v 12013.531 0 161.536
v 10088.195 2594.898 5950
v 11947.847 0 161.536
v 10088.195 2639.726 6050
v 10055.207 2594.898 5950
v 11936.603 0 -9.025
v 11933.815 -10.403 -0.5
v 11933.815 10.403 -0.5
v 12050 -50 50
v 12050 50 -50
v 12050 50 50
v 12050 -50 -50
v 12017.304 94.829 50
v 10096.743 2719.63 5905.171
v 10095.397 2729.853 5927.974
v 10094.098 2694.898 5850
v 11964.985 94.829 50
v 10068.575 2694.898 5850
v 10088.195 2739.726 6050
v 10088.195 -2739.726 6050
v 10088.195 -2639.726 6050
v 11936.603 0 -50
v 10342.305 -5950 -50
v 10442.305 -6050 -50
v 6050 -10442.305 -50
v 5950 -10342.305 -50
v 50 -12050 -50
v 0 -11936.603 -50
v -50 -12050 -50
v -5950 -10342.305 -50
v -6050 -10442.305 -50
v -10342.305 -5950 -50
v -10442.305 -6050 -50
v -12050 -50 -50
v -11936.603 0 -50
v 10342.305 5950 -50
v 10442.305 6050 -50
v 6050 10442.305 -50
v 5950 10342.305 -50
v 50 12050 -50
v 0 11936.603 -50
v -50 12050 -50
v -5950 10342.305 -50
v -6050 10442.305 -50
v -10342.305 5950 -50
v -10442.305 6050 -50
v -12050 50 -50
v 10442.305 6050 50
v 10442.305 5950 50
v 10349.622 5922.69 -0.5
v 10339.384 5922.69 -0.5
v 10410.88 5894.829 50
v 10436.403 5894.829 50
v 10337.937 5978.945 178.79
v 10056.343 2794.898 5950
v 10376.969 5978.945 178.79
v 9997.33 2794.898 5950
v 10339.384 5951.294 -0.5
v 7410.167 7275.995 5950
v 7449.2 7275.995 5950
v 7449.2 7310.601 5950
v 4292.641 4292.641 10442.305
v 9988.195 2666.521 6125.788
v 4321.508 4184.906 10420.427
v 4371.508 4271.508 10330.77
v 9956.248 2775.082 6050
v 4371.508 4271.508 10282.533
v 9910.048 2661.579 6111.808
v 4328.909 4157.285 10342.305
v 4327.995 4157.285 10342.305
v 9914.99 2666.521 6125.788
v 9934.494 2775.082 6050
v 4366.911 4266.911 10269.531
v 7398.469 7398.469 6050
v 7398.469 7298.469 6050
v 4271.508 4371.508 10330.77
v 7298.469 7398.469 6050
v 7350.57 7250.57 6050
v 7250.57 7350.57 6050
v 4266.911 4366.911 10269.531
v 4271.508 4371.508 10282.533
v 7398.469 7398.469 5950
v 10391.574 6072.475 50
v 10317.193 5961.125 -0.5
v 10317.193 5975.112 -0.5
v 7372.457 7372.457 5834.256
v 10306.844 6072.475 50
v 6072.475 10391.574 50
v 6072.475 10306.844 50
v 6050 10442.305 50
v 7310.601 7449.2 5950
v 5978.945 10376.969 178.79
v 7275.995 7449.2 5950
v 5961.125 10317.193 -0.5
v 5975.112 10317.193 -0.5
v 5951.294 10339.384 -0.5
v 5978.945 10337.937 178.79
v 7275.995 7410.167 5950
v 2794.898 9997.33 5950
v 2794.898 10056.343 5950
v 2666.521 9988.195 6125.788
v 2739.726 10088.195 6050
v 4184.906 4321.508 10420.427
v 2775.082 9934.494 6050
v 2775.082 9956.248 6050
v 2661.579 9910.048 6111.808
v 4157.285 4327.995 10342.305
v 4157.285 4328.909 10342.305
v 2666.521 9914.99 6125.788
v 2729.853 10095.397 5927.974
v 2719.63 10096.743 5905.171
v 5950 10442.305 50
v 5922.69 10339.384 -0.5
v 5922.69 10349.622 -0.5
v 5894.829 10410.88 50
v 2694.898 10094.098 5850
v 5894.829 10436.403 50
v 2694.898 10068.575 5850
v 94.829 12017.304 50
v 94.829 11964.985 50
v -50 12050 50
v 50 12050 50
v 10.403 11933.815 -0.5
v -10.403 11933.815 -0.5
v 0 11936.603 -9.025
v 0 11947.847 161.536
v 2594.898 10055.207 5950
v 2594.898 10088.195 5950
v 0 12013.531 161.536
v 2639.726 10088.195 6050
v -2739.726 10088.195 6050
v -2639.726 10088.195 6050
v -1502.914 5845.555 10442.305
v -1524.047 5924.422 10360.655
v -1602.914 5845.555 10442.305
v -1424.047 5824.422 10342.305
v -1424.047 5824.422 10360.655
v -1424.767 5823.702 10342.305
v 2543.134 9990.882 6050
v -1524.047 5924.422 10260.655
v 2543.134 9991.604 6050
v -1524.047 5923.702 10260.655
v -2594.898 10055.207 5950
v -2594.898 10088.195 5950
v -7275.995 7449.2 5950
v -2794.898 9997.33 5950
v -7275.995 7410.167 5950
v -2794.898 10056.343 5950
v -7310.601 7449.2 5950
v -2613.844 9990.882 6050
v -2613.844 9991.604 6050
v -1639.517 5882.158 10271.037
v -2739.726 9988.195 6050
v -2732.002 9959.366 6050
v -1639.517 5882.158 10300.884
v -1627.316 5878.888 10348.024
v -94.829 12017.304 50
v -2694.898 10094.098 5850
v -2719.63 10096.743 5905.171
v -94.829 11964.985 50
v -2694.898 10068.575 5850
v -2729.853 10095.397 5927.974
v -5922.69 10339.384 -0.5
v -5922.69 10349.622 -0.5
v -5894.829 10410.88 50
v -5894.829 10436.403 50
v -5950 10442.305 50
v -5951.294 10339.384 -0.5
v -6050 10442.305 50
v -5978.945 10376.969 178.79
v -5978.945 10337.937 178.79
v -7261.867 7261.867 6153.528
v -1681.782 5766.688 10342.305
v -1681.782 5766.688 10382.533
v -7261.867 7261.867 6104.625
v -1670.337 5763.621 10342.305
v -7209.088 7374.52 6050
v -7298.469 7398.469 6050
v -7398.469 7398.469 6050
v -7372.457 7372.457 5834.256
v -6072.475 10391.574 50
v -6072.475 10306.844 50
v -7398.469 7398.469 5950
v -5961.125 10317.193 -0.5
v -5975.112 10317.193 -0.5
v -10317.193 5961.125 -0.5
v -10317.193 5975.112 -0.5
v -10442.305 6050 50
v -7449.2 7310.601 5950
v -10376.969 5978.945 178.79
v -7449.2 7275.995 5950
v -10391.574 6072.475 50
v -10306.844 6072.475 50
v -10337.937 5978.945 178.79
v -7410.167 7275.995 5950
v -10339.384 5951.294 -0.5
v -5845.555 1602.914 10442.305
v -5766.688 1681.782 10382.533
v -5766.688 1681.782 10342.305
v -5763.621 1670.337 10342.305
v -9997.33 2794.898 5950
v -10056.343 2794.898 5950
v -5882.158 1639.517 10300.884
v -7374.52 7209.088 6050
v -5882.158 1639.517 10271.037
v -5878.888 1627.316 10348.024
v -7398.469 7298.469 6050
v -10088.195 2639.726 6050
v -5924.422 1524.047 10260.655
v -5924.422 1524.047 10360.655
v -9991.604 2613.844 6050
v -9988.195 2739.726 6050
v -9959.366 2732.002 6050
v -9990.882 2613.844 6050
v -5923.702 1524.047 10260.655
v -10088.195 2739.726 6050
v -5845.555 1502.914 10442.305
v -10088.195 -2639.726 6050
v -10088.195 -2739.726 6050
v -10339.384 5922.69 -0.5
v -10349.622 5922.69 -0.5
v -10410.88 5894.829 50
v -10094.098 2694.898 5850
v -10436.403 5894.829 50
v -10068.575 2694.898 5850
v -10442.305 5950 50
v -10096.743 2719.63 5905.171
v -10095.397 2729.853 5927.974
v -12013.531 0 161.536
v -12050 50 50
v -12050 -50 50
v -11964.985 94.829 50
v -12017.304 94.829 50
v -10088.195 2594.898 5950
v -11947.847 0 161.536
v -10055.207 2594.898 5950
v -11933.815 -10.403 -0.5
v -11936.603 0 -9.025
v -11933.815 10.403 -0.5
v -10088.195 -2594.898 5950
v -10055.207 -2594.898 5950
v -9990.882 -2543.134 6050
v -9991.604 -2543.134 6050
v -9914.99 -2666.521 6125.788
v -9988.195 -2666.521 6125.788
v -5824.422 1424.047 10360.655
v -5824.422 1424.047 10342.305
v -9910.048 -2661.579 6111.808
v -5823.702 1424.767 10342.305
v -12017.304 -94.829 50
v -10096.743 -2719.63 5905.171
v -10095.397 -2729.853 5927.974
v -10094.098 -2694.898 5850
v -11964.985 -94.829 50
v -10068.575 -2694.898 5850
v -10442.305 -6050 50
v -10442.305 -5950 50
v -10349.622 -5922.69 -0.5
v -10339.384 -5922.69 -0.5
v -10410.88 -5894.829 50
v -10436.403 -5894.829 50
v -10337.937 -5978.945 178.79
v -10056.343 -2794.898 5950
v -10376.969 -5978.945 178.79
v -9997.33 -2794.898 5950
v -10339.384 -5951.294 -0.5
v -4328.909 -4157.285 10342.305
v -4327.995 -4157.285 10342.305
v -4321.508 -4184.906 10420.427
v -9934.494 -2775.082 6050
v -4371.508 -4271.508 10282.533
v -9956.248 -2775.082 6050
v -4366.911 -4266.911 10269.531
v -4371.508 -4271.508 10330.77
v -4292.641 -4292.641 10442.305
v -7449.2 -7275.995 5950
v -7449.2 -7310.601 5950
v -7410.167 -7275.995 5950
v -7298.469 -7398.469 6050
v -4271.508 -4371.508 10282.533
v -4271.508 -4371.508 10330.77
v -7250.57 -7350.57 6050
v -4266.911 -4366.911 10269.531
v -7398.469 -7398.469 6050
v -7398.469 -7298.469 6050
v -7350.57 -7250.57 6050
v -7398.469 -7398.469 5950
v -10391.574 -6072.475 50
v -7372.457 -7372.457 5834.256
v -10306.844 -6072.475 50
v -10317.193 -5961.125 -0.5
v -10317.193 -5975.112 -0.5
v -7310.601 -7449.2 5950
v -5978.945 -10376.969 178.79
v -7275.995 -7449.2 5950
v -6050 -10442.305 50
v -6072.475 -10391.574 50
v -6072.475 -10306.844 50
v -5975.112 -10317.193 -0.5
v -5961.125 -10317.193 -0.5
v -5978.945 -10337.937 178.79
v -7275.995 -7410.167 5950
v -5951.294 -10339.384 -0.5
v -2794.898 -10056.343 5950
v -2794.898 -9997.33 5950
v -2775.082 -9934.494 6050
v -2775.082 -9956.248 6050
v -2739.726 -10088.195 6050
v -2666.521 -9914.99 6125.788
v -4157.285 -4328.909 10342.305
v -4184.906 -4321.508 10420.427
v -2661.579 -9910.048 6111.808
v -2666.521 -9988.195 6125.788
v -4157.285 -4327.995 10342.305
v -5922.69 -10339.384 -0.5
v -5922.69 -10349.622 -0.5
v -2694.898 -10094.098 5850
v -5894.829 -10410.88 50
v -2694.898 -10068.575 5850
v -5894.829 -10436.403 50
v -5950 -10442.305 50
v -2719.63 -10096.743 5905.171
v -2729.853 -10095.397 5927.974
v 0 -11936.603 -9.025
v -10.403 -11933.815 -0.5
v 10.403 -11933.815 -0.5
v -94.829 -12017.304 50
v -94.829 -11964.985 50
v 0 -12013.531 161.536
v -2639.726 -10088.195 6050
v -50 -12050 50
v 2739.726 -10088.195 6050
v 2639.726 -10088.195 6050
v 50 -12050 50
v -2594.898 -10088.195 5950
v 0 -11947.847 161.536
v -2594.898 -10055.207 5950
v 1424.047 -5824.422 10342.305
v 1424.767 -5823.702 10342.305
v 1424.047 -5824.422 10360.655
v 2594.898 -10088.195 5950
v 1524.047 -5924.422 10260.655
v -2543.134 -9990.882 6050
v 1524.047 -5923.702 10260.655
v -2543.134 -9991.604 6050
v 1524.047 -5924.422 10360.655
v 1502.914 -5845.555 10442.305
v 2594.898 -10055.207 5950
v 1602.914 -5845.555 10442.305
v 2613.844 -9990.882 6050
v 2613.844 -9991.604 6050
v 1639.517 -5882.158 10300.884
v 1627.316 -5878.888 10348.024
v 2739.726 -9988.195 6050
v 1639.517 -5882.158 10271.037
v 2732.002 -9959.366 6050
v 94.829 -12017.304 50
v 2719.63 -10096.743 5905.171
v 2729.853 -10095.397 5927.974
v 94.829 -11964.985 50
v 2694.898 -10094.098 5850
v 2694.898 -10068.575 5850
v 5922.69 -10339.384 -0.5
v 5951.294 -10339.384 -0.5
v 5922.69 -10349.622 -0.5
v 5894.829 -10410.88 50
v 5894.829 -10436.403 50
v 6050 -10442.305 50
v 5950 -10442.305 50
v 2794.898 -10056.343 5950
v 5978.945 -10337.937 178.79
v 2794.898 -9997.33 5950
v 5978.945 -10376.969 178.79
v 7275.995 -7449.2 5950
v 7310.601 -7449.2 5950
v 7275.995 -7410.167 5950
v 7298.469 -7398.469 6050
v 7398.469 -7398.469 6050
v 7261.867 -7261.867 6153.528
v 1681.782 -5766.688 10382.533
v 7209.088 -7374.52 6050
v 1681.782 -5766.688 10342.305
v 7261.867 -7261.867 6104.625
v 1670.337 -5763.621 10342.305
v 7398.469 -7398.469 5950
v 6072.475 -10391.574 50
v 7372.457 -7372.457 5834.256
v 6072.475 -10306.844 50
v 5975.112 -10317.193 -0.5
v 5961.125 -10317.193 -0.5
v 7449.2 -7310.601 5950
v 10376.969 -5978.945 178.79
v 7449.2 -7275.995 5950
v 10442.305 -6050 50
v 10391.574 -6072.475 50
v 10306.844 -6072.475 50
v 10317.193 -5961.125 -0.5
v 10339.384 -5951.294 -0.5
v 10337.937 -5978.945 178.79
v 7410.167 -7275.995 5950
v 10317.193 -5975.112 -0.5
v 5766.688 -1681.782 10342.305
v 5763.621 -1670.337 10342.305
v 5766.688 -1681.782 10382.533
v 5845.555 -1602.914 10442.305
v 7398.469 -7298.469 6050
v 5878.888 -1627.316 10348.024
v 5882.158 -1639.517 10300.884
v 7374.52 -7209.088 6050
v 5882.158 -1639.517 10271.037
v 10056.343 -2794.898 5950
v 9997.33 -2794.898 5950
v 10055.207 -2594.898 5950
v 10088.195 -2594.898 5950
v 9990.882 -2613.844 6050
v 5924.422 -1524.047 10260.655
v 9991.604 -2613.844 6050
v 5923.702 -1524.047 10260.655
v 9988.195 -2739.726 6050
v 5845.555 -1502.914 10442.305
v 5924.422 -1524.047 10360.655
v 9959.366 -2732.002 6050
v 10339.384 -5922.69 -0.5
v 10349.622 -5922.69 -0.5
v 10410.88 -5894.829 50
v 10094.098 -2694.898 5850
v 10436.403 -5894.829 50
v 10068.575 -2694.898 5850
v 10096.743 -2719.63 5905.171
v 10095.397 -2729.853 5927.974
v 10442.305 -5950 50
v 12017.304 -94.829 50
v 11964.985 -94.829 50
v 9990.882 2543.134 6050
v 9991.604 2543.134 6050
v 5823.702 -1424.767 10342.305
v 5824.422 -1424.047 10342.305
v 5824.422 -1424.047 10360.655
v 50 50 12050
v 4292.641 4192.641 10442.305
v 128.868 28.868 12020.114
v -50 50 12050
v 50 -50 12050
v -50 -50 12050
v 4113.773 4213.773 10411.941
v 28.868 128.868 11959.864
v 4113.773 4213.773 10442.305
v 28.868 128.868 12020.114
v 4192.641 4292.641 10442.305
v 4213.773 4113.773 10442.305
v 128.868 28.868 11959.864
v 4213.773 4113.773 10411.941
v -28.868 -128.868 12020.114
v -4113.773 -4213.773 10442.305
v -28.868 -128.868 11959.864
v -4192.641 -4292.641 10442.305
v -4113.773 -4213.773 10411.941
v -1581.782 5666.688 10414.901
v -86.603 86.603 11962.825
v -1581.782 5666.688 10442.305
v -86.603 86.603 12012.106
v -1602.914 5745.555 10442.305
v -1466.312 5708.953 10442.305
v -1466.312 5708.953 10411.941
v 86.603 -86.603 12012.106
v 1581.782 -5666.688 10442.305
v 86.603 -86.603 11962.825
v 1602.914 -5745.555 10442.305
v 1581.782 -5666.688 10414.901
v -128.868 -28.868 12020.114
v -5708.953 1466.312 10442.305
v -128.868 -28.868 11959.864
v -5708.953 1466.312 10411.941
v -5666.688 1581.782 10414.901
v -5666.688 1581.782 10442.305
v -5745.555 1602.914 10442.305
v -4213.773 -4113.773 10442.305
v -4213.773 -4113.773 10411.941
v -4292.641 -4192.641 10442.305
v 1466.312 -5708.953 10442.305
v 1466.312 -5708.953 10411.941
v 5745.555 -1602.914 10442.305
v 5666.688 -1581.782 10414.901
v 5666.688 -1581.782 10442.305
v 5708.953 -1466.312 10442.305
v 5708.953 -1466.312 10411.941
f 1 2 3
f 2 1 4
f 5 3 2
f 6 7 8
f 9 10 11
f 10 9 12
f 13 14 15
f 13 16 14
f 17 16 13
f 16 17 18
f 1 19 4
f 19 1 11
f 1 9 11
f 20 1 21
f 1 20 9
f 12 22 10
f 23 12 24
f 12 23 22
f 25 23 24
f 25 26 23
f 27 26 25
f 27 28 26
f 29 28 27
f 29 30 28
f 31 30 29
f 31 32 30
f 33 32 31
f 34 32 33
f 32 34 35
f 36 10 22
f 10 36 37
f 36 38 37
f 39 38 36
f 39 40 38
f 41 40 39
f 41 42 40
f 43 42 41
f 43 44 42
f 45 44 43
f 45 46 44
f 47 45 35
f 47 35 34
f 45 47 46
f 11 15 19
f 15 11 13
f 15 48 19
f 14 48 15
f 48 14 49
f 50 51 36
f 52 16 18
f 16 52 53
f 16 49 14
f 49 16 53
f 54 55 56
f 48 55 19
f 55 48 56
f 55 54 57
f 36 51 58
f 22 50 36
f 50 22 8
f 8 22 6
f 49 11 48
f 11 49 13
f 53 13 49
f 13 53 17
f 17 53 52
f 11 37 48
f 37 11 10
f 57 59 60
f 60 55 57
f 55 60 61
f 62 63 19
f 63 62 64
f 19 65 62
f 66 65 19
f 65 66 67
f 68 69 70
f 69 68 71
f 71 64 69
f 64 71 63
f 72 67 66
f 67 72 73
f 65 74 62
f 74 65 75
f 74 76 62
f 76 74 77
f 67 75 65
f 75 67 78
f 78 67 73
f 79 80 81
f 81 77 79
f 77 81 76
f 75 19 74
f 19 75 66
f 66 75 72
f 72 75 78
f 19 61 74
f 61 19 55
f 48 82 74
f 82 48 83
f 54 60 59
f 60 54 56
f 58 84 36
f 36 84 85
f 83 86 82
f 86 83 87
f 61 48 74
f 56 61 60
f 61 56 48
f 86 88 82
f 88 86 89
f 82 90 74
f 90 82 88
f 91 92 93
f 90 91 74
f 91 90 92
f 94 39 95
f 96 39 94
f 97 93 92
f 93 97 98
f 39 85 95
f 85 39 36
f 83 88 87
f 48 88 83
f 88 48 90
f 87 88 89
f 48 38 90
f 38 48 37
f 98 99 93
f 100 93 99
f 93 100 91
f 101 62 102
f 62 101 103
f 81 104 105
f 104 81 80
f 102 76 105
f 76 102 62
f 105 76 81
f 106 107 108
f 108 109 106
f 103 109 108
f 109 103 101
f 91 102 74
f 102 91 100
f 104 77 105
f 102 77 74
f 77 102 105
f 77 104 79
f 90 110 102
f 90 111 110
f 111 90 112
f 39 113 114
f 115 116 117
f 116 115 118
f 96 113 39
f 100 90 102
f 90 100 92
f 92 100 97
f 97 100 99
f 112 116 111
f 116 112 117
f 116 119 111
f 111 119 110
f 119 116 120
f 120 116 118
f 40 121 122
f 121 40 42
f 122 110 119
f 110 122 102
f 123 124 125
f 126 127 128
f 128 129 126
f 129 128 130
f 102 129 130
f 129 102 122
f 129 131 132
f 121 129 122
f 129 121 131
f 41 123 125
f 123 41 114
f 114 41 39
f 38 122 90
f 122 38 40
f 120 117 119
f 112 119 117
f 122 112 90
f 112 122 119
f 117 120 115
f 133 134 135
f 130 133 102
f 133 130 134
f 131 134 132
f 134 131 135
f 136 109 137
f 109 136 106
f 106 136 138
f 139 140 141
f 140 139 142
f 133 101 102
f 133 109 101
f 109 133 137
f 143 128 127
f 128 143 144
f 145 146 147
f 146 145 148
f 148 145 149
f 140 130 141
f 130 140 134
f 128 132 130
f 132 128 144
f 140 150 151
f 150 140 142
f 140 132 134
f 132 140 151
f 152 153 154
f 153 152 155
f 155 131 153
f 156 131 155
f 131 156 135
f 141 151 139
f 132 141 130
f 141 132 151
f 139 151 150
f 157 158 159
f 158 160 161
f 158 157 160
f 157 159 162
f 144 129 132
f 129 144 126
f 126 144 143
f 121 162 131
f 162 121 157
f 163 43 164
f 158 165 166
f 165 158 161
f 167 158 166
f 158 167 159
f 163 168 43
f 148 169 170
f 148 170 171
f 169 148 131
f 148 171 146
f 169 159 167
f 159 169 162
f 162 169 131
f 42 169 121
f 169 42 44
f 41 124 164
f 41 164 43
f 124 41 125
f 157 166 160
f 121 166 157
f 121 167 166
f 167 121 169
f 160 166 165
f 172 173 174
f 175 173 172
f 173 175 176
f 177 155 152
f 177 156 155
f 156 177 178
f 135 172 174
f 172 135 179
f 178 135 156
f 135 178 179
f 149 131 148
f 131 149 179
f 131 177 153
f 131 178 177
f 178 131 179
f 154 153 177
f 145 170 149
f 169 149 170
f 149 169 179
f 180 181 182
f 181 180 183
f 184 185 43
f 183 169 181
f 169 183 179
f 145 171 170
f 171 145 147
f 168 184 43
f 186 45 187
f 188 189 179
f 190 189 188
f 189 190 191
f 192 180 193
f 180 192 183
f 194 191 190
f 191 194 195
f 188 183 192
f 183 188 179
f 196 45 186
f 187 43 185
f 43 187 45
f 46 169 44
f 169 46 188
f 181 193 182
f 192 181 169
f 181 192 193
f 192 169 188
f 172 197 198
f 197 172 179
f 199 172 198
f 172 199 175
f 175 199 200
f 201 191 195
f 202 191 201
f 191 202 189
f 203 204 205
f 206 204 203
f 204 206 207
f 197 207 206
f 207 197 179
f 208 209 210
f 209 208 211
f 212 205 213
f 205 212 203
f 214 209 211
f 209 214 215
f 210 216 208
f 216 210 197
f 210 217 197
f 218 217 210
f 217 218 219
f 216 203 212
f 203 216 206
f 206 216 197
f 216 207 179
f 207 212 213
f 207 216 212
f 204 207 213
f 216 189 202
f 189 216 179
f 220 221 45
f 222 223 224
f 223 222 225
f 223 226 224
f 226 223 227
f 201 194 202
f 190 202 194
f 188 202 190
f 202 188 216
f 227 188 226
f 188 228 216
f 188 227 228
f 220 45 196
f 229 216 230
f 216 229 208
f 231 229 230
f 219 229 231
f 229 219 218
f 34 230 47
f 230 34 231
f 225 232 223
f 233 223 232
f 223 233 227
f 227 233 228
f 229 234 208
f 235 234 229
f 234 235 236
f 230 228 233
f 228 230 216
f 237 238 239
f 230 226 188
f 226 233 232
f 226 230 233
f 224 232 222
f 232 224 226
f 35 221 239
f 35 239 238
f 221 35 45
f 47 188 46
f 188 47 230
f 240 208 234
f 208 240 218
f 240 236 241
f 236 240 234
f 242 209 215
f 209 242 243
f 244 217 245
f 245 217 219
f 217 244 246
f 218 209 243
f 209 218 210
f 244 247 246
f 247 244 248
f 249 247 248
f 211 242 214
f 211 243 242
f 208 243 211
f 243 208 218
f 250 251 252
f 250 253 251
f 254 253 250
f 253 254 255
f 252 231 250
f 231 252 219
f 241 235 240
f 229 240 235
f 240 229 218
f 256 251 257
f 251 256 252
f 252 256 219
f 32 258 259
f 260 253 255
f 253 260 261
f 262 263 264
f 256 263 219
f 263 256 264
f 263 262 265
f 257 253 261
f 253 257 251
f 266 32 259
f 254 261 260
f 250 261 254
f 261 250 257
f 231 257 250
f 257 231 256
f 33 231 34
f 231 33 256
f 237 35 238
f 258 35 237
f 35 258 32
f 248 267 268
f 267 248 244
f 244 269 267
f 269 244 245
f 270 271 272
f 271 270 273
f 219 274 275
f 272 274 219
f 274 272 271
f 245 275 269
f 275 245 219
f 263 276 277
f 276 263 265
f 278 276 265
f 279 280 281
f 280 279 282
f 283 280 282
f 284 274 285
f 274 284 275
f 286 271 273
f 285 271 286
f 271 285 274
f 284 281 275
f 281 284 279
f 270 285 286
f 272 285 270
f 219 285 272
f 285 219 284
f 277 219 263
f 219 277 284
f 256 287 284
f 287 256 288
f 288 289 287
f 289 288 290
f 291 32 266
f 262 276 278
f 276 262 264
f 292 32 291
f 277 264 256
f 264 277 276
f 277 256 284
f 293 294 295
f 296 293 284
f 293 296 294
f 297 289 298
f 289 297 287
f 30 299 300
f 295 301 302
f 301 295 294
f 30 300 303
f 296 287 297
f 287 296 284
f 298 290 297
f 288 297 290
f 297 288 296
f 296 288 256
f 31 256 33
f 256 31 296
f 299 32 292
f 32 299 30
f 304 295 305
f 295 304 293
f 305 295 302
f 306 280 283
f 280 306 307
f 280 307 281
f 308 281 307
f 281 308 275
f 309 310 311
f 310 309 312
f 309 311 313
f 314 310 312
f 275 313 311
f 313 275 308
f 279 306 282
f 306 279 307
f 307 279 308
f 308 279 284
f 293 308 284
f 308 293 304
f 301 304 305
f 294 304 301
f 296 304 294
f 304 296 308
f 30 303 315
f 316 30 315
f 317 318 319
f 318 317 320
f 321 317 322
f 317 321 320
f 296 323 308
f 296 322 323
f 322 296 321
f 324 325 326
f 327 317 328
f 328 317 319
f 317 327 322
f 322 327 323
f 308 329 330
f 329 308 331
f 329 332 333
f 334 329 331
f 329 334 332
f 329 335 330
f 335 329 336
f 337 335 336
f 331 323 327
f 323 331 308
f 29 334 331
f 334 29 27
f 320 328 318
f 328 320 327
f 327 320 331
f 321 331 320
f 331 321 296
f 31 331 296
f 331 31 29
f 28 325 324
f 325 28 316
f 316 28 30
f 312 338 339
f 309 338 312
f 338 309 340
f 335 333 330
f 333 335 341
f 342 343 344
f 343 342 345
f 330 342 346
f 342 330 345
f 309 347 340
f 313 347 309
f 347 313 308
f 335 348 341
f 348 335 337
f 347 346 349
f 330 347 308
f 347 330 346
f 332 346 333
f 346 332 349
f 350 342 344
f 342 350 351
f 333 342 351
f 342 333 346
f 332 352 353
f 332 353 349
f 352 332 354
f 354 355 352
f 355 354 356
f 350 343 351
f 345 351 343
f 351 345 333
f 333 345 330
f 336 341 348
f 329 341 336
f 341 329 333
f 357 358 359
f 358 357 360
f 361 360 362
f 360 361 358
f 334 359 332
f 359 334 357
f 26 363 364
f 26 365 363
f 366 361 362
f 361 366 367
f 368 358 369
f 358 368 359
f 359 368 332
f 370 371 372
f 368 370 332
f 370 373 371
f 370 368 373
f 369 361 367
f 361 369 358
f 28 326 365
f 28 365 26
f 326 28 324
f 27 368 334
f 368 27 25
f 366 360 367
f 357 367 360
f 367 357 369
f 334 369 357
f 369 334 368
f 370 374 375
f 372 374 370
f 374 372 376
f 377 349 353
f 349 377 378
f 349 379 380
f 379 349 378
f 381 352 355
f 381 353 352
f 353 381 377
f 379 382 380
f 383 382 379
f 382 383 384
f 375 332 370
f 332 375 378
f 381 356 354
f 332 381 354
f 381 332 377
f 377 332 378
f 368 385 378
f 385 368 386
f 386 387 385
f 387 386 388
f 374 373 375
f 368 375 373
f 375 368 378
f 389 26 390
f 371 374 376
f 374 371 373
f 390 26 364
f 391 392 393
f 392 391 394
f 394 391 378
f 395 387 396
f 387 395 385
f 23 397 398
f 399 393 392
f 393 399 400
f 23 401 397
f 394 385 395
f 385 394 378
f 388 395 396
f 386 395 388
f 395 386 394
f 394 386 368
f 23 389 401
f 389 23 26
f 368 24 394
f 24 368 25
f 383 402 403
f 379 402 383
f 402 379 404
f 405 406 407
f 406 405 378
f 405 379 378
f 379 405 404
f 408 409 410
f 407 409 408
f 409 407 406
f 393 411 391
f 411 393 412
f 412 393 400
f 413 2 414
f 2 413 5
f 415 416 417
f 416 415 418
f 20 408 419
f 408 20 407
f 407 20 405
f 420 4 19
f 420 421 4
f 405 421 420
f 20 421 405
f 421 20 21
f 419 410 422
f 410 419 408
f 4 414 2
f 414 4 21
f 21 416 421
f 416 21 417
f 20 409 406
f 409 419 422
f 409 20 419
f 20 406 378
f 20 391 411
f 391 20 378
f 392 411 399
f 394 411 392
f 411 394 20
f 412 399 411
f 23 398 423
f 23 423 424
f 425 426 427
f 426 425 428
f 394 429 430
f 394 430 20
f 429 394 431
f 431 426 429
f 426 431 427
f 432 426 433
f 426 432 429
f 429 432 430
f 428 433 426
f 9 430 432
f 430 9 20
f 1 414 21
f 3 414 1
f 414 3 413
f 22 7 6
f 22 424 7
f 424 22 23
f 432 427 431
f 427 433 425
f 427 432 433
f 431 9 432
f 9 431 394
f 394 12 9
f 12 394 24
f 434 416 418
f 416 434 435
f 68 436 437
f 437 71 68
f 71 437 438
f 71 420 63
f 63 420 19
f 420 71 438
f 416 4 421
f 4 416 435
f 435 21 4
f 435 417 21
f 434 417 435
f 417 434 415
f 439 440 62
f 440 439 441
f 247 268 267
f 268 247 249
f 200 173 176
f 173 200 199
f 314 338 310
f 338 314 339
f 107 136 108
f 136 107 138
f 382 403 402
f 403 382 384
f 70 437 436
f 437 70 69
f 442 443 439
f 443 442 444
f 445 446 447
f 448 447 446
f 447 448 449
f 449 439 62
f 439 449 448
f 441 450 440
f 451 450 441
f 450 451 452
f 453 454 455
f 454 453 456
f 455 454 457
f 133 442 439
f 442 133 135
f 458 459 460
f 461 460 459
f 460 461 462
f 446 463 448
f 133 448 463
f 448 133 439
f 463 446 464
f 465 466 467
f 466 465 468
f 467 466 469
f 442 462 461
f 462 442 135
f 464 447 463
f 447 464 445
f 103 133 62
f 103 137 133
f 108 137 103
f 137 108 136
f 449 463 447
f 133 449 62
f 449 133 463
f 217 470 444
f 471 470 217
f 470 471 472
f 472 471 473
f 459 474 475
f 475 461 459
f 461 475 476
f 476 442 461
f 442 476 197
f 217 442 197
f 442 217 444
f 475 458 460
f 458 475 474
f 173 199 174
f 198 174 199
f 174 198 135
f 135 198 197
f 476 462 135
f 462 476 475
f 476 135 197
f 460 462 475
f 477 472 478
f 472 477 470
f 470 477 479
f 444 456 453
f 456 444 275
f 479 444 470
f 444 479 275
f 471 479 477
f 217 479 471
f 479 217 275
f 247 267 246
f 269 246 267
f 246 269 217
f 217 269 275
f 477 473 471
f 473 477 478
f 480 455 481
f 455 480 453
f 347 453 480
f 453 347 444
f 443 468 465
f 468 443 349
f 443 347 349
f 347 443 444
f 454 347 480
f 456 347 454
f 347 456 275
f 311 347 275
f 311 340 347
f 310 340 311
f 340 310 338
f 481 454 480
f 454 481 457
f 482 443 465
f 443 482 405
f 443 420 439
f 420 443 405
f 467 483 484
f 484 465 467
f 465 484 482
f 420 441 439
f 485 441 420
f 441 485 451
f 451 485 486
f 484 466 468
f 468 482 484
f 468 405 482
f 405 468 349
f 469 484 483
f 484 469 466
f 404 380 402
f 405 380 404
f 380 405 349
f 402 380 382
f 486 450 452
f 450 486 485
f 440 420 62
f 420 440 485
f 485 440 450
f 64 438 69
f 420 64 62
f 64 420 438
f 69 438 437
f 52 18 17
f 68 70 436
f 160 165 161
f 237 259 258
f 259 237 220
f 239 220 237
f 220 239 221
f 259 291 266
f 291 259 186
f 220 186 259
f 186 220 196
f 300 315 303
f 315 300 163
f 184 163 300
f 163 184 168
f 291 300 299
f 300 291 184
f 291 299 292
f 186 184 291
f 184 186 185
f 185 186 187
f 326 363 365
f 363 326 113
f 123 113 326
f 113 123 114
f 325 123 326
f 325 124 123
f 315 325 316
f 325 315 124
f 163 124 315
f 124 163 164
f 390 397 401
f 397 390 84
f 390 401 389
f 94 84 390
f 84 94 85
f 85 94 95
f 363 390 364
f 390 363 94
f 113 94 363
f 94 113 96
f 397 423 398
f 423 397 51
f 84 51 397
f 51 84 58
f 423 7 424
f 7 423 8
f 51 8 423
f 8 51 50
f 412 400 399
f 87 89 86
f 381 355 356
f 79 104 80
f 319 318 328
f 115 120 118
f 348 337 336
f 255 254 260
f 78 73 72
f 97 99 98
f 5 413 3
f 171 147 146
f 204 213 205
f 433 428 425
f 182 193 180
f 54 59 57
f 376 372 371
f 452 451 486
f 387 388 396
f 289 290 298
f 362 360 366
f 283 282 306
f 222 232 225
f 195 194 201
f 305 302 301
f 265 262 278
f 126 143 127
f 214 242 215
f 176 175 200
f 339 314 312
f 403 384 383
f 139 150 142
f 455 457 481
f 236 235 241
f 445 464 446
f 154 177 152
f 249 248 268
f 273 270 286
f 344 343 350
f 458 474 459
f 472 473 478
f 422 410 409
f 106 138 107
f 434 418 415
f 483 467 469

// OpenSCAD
/*
 Sci-fi dome shape.
 Not a regular geodesic dome.

 Dr. Orion Lawlor, lawlor@alaska.edu, 2024-10-28 (Public Domain)
*/

$fs=0.1; $fa=5; // fine detail

// Make this 3D vector have unit length
function normalize(p) = p * (1.0/norm(p));

/// Create a transform matrix so the Z axis is facing this way,
///   and S is the new origin.
module point_Z_axis_toward(Znew,S)
{
    Z=normalize(Znew); // direction (new Z)
    Y=normalize(cross(Z,[0.001,-0.001,1])); // up vector (new Y)
    X=normalize(cross(Y,Z)); // out vector (new X)
    m=[
        [X.x,Y.x,Z.x,S.x],
        [X.y,Y.y,Z.y,S.y],
        [X.z,Y.z,Z.z,S.z]
    ];
    multmatrix(m) children();
}



// Create a tube between these two points
//   OD is diameter of tube
//   tube extends beyond the points by lengthen on both sides
module tube_between(p1,p2, ODraw, enlarge)
{
    OD = ODraw + 2*enlarge;
    hull() {
        for (p=[p1,p2]) translate(p) {
            //sphere(d=OD);
            cube([1,1,1]*OD, center=true);
        }
    }
    /*
    point_Z_axis_toward(p2-p1,p1)
    translate([0,0,-enlarge]) {
        len = norm(p2-p1)+2*enlarge;
        cylinder(d=OD,h=len);
    }
    */
}

// Draw a tube passing through these points
module tube_list(list,OD,enlarge)
{
    for (i=[0:len(list)-1]) 
        tube_between(list[i], list[(i+1)%len(list)], OD, enlarge);
}


domeR = 12000; // radius of dome
domeN = 12; // segments in dome, 30 degrees each

function make_dome_ring(R,Z,N,sa=0) = [
    for (a=[sa:360/N:360+sa+1])
        [R*cos(a), R*sin(a), Z],
];

domeP = make_dome_ring(domeR,0,domeN,0); // outer ring
dome1 = make_dome_ring(domeR*cos(30),domeR*sin(30),domeN,360/domeN/2); // layer 1
dome2 = make_dome_ring(domeR*cos(60),domeR*sin(60),domeN/2,360/domeN*1.5); // layer 2
dome3 = [ [0,0,domeR] ]; // top vertex

OD=100; // diameter of main tubes

// Full list of truss tubes
module truss_tubes(enlarge=0)
{
    for (i=[0:domeN-1]) {
        tube_list([domeP[i],dome1[i],domeP[i+1]],OD,enlarge);
        tube_list([dome1[i],dome2[floor(i/2)],dome1[i+1]],OD,enlarge);
    }
    for (i=[0:domeN/2-1]) {
        tube_list([dome2[i],dome3[0],dome2[i+1]],OD,enlarge);
    }
}

// Drop children at all dome points
module truss_points() {
    for (list = [domeP, dome1, dome2, dome3])
        for (p = list)
            translate(p)
                children();
}

truss_tubes(0);
color([0.3,0.5,0.8,0.3]) hull() truss_points() cube([1,1,1],center=true);
